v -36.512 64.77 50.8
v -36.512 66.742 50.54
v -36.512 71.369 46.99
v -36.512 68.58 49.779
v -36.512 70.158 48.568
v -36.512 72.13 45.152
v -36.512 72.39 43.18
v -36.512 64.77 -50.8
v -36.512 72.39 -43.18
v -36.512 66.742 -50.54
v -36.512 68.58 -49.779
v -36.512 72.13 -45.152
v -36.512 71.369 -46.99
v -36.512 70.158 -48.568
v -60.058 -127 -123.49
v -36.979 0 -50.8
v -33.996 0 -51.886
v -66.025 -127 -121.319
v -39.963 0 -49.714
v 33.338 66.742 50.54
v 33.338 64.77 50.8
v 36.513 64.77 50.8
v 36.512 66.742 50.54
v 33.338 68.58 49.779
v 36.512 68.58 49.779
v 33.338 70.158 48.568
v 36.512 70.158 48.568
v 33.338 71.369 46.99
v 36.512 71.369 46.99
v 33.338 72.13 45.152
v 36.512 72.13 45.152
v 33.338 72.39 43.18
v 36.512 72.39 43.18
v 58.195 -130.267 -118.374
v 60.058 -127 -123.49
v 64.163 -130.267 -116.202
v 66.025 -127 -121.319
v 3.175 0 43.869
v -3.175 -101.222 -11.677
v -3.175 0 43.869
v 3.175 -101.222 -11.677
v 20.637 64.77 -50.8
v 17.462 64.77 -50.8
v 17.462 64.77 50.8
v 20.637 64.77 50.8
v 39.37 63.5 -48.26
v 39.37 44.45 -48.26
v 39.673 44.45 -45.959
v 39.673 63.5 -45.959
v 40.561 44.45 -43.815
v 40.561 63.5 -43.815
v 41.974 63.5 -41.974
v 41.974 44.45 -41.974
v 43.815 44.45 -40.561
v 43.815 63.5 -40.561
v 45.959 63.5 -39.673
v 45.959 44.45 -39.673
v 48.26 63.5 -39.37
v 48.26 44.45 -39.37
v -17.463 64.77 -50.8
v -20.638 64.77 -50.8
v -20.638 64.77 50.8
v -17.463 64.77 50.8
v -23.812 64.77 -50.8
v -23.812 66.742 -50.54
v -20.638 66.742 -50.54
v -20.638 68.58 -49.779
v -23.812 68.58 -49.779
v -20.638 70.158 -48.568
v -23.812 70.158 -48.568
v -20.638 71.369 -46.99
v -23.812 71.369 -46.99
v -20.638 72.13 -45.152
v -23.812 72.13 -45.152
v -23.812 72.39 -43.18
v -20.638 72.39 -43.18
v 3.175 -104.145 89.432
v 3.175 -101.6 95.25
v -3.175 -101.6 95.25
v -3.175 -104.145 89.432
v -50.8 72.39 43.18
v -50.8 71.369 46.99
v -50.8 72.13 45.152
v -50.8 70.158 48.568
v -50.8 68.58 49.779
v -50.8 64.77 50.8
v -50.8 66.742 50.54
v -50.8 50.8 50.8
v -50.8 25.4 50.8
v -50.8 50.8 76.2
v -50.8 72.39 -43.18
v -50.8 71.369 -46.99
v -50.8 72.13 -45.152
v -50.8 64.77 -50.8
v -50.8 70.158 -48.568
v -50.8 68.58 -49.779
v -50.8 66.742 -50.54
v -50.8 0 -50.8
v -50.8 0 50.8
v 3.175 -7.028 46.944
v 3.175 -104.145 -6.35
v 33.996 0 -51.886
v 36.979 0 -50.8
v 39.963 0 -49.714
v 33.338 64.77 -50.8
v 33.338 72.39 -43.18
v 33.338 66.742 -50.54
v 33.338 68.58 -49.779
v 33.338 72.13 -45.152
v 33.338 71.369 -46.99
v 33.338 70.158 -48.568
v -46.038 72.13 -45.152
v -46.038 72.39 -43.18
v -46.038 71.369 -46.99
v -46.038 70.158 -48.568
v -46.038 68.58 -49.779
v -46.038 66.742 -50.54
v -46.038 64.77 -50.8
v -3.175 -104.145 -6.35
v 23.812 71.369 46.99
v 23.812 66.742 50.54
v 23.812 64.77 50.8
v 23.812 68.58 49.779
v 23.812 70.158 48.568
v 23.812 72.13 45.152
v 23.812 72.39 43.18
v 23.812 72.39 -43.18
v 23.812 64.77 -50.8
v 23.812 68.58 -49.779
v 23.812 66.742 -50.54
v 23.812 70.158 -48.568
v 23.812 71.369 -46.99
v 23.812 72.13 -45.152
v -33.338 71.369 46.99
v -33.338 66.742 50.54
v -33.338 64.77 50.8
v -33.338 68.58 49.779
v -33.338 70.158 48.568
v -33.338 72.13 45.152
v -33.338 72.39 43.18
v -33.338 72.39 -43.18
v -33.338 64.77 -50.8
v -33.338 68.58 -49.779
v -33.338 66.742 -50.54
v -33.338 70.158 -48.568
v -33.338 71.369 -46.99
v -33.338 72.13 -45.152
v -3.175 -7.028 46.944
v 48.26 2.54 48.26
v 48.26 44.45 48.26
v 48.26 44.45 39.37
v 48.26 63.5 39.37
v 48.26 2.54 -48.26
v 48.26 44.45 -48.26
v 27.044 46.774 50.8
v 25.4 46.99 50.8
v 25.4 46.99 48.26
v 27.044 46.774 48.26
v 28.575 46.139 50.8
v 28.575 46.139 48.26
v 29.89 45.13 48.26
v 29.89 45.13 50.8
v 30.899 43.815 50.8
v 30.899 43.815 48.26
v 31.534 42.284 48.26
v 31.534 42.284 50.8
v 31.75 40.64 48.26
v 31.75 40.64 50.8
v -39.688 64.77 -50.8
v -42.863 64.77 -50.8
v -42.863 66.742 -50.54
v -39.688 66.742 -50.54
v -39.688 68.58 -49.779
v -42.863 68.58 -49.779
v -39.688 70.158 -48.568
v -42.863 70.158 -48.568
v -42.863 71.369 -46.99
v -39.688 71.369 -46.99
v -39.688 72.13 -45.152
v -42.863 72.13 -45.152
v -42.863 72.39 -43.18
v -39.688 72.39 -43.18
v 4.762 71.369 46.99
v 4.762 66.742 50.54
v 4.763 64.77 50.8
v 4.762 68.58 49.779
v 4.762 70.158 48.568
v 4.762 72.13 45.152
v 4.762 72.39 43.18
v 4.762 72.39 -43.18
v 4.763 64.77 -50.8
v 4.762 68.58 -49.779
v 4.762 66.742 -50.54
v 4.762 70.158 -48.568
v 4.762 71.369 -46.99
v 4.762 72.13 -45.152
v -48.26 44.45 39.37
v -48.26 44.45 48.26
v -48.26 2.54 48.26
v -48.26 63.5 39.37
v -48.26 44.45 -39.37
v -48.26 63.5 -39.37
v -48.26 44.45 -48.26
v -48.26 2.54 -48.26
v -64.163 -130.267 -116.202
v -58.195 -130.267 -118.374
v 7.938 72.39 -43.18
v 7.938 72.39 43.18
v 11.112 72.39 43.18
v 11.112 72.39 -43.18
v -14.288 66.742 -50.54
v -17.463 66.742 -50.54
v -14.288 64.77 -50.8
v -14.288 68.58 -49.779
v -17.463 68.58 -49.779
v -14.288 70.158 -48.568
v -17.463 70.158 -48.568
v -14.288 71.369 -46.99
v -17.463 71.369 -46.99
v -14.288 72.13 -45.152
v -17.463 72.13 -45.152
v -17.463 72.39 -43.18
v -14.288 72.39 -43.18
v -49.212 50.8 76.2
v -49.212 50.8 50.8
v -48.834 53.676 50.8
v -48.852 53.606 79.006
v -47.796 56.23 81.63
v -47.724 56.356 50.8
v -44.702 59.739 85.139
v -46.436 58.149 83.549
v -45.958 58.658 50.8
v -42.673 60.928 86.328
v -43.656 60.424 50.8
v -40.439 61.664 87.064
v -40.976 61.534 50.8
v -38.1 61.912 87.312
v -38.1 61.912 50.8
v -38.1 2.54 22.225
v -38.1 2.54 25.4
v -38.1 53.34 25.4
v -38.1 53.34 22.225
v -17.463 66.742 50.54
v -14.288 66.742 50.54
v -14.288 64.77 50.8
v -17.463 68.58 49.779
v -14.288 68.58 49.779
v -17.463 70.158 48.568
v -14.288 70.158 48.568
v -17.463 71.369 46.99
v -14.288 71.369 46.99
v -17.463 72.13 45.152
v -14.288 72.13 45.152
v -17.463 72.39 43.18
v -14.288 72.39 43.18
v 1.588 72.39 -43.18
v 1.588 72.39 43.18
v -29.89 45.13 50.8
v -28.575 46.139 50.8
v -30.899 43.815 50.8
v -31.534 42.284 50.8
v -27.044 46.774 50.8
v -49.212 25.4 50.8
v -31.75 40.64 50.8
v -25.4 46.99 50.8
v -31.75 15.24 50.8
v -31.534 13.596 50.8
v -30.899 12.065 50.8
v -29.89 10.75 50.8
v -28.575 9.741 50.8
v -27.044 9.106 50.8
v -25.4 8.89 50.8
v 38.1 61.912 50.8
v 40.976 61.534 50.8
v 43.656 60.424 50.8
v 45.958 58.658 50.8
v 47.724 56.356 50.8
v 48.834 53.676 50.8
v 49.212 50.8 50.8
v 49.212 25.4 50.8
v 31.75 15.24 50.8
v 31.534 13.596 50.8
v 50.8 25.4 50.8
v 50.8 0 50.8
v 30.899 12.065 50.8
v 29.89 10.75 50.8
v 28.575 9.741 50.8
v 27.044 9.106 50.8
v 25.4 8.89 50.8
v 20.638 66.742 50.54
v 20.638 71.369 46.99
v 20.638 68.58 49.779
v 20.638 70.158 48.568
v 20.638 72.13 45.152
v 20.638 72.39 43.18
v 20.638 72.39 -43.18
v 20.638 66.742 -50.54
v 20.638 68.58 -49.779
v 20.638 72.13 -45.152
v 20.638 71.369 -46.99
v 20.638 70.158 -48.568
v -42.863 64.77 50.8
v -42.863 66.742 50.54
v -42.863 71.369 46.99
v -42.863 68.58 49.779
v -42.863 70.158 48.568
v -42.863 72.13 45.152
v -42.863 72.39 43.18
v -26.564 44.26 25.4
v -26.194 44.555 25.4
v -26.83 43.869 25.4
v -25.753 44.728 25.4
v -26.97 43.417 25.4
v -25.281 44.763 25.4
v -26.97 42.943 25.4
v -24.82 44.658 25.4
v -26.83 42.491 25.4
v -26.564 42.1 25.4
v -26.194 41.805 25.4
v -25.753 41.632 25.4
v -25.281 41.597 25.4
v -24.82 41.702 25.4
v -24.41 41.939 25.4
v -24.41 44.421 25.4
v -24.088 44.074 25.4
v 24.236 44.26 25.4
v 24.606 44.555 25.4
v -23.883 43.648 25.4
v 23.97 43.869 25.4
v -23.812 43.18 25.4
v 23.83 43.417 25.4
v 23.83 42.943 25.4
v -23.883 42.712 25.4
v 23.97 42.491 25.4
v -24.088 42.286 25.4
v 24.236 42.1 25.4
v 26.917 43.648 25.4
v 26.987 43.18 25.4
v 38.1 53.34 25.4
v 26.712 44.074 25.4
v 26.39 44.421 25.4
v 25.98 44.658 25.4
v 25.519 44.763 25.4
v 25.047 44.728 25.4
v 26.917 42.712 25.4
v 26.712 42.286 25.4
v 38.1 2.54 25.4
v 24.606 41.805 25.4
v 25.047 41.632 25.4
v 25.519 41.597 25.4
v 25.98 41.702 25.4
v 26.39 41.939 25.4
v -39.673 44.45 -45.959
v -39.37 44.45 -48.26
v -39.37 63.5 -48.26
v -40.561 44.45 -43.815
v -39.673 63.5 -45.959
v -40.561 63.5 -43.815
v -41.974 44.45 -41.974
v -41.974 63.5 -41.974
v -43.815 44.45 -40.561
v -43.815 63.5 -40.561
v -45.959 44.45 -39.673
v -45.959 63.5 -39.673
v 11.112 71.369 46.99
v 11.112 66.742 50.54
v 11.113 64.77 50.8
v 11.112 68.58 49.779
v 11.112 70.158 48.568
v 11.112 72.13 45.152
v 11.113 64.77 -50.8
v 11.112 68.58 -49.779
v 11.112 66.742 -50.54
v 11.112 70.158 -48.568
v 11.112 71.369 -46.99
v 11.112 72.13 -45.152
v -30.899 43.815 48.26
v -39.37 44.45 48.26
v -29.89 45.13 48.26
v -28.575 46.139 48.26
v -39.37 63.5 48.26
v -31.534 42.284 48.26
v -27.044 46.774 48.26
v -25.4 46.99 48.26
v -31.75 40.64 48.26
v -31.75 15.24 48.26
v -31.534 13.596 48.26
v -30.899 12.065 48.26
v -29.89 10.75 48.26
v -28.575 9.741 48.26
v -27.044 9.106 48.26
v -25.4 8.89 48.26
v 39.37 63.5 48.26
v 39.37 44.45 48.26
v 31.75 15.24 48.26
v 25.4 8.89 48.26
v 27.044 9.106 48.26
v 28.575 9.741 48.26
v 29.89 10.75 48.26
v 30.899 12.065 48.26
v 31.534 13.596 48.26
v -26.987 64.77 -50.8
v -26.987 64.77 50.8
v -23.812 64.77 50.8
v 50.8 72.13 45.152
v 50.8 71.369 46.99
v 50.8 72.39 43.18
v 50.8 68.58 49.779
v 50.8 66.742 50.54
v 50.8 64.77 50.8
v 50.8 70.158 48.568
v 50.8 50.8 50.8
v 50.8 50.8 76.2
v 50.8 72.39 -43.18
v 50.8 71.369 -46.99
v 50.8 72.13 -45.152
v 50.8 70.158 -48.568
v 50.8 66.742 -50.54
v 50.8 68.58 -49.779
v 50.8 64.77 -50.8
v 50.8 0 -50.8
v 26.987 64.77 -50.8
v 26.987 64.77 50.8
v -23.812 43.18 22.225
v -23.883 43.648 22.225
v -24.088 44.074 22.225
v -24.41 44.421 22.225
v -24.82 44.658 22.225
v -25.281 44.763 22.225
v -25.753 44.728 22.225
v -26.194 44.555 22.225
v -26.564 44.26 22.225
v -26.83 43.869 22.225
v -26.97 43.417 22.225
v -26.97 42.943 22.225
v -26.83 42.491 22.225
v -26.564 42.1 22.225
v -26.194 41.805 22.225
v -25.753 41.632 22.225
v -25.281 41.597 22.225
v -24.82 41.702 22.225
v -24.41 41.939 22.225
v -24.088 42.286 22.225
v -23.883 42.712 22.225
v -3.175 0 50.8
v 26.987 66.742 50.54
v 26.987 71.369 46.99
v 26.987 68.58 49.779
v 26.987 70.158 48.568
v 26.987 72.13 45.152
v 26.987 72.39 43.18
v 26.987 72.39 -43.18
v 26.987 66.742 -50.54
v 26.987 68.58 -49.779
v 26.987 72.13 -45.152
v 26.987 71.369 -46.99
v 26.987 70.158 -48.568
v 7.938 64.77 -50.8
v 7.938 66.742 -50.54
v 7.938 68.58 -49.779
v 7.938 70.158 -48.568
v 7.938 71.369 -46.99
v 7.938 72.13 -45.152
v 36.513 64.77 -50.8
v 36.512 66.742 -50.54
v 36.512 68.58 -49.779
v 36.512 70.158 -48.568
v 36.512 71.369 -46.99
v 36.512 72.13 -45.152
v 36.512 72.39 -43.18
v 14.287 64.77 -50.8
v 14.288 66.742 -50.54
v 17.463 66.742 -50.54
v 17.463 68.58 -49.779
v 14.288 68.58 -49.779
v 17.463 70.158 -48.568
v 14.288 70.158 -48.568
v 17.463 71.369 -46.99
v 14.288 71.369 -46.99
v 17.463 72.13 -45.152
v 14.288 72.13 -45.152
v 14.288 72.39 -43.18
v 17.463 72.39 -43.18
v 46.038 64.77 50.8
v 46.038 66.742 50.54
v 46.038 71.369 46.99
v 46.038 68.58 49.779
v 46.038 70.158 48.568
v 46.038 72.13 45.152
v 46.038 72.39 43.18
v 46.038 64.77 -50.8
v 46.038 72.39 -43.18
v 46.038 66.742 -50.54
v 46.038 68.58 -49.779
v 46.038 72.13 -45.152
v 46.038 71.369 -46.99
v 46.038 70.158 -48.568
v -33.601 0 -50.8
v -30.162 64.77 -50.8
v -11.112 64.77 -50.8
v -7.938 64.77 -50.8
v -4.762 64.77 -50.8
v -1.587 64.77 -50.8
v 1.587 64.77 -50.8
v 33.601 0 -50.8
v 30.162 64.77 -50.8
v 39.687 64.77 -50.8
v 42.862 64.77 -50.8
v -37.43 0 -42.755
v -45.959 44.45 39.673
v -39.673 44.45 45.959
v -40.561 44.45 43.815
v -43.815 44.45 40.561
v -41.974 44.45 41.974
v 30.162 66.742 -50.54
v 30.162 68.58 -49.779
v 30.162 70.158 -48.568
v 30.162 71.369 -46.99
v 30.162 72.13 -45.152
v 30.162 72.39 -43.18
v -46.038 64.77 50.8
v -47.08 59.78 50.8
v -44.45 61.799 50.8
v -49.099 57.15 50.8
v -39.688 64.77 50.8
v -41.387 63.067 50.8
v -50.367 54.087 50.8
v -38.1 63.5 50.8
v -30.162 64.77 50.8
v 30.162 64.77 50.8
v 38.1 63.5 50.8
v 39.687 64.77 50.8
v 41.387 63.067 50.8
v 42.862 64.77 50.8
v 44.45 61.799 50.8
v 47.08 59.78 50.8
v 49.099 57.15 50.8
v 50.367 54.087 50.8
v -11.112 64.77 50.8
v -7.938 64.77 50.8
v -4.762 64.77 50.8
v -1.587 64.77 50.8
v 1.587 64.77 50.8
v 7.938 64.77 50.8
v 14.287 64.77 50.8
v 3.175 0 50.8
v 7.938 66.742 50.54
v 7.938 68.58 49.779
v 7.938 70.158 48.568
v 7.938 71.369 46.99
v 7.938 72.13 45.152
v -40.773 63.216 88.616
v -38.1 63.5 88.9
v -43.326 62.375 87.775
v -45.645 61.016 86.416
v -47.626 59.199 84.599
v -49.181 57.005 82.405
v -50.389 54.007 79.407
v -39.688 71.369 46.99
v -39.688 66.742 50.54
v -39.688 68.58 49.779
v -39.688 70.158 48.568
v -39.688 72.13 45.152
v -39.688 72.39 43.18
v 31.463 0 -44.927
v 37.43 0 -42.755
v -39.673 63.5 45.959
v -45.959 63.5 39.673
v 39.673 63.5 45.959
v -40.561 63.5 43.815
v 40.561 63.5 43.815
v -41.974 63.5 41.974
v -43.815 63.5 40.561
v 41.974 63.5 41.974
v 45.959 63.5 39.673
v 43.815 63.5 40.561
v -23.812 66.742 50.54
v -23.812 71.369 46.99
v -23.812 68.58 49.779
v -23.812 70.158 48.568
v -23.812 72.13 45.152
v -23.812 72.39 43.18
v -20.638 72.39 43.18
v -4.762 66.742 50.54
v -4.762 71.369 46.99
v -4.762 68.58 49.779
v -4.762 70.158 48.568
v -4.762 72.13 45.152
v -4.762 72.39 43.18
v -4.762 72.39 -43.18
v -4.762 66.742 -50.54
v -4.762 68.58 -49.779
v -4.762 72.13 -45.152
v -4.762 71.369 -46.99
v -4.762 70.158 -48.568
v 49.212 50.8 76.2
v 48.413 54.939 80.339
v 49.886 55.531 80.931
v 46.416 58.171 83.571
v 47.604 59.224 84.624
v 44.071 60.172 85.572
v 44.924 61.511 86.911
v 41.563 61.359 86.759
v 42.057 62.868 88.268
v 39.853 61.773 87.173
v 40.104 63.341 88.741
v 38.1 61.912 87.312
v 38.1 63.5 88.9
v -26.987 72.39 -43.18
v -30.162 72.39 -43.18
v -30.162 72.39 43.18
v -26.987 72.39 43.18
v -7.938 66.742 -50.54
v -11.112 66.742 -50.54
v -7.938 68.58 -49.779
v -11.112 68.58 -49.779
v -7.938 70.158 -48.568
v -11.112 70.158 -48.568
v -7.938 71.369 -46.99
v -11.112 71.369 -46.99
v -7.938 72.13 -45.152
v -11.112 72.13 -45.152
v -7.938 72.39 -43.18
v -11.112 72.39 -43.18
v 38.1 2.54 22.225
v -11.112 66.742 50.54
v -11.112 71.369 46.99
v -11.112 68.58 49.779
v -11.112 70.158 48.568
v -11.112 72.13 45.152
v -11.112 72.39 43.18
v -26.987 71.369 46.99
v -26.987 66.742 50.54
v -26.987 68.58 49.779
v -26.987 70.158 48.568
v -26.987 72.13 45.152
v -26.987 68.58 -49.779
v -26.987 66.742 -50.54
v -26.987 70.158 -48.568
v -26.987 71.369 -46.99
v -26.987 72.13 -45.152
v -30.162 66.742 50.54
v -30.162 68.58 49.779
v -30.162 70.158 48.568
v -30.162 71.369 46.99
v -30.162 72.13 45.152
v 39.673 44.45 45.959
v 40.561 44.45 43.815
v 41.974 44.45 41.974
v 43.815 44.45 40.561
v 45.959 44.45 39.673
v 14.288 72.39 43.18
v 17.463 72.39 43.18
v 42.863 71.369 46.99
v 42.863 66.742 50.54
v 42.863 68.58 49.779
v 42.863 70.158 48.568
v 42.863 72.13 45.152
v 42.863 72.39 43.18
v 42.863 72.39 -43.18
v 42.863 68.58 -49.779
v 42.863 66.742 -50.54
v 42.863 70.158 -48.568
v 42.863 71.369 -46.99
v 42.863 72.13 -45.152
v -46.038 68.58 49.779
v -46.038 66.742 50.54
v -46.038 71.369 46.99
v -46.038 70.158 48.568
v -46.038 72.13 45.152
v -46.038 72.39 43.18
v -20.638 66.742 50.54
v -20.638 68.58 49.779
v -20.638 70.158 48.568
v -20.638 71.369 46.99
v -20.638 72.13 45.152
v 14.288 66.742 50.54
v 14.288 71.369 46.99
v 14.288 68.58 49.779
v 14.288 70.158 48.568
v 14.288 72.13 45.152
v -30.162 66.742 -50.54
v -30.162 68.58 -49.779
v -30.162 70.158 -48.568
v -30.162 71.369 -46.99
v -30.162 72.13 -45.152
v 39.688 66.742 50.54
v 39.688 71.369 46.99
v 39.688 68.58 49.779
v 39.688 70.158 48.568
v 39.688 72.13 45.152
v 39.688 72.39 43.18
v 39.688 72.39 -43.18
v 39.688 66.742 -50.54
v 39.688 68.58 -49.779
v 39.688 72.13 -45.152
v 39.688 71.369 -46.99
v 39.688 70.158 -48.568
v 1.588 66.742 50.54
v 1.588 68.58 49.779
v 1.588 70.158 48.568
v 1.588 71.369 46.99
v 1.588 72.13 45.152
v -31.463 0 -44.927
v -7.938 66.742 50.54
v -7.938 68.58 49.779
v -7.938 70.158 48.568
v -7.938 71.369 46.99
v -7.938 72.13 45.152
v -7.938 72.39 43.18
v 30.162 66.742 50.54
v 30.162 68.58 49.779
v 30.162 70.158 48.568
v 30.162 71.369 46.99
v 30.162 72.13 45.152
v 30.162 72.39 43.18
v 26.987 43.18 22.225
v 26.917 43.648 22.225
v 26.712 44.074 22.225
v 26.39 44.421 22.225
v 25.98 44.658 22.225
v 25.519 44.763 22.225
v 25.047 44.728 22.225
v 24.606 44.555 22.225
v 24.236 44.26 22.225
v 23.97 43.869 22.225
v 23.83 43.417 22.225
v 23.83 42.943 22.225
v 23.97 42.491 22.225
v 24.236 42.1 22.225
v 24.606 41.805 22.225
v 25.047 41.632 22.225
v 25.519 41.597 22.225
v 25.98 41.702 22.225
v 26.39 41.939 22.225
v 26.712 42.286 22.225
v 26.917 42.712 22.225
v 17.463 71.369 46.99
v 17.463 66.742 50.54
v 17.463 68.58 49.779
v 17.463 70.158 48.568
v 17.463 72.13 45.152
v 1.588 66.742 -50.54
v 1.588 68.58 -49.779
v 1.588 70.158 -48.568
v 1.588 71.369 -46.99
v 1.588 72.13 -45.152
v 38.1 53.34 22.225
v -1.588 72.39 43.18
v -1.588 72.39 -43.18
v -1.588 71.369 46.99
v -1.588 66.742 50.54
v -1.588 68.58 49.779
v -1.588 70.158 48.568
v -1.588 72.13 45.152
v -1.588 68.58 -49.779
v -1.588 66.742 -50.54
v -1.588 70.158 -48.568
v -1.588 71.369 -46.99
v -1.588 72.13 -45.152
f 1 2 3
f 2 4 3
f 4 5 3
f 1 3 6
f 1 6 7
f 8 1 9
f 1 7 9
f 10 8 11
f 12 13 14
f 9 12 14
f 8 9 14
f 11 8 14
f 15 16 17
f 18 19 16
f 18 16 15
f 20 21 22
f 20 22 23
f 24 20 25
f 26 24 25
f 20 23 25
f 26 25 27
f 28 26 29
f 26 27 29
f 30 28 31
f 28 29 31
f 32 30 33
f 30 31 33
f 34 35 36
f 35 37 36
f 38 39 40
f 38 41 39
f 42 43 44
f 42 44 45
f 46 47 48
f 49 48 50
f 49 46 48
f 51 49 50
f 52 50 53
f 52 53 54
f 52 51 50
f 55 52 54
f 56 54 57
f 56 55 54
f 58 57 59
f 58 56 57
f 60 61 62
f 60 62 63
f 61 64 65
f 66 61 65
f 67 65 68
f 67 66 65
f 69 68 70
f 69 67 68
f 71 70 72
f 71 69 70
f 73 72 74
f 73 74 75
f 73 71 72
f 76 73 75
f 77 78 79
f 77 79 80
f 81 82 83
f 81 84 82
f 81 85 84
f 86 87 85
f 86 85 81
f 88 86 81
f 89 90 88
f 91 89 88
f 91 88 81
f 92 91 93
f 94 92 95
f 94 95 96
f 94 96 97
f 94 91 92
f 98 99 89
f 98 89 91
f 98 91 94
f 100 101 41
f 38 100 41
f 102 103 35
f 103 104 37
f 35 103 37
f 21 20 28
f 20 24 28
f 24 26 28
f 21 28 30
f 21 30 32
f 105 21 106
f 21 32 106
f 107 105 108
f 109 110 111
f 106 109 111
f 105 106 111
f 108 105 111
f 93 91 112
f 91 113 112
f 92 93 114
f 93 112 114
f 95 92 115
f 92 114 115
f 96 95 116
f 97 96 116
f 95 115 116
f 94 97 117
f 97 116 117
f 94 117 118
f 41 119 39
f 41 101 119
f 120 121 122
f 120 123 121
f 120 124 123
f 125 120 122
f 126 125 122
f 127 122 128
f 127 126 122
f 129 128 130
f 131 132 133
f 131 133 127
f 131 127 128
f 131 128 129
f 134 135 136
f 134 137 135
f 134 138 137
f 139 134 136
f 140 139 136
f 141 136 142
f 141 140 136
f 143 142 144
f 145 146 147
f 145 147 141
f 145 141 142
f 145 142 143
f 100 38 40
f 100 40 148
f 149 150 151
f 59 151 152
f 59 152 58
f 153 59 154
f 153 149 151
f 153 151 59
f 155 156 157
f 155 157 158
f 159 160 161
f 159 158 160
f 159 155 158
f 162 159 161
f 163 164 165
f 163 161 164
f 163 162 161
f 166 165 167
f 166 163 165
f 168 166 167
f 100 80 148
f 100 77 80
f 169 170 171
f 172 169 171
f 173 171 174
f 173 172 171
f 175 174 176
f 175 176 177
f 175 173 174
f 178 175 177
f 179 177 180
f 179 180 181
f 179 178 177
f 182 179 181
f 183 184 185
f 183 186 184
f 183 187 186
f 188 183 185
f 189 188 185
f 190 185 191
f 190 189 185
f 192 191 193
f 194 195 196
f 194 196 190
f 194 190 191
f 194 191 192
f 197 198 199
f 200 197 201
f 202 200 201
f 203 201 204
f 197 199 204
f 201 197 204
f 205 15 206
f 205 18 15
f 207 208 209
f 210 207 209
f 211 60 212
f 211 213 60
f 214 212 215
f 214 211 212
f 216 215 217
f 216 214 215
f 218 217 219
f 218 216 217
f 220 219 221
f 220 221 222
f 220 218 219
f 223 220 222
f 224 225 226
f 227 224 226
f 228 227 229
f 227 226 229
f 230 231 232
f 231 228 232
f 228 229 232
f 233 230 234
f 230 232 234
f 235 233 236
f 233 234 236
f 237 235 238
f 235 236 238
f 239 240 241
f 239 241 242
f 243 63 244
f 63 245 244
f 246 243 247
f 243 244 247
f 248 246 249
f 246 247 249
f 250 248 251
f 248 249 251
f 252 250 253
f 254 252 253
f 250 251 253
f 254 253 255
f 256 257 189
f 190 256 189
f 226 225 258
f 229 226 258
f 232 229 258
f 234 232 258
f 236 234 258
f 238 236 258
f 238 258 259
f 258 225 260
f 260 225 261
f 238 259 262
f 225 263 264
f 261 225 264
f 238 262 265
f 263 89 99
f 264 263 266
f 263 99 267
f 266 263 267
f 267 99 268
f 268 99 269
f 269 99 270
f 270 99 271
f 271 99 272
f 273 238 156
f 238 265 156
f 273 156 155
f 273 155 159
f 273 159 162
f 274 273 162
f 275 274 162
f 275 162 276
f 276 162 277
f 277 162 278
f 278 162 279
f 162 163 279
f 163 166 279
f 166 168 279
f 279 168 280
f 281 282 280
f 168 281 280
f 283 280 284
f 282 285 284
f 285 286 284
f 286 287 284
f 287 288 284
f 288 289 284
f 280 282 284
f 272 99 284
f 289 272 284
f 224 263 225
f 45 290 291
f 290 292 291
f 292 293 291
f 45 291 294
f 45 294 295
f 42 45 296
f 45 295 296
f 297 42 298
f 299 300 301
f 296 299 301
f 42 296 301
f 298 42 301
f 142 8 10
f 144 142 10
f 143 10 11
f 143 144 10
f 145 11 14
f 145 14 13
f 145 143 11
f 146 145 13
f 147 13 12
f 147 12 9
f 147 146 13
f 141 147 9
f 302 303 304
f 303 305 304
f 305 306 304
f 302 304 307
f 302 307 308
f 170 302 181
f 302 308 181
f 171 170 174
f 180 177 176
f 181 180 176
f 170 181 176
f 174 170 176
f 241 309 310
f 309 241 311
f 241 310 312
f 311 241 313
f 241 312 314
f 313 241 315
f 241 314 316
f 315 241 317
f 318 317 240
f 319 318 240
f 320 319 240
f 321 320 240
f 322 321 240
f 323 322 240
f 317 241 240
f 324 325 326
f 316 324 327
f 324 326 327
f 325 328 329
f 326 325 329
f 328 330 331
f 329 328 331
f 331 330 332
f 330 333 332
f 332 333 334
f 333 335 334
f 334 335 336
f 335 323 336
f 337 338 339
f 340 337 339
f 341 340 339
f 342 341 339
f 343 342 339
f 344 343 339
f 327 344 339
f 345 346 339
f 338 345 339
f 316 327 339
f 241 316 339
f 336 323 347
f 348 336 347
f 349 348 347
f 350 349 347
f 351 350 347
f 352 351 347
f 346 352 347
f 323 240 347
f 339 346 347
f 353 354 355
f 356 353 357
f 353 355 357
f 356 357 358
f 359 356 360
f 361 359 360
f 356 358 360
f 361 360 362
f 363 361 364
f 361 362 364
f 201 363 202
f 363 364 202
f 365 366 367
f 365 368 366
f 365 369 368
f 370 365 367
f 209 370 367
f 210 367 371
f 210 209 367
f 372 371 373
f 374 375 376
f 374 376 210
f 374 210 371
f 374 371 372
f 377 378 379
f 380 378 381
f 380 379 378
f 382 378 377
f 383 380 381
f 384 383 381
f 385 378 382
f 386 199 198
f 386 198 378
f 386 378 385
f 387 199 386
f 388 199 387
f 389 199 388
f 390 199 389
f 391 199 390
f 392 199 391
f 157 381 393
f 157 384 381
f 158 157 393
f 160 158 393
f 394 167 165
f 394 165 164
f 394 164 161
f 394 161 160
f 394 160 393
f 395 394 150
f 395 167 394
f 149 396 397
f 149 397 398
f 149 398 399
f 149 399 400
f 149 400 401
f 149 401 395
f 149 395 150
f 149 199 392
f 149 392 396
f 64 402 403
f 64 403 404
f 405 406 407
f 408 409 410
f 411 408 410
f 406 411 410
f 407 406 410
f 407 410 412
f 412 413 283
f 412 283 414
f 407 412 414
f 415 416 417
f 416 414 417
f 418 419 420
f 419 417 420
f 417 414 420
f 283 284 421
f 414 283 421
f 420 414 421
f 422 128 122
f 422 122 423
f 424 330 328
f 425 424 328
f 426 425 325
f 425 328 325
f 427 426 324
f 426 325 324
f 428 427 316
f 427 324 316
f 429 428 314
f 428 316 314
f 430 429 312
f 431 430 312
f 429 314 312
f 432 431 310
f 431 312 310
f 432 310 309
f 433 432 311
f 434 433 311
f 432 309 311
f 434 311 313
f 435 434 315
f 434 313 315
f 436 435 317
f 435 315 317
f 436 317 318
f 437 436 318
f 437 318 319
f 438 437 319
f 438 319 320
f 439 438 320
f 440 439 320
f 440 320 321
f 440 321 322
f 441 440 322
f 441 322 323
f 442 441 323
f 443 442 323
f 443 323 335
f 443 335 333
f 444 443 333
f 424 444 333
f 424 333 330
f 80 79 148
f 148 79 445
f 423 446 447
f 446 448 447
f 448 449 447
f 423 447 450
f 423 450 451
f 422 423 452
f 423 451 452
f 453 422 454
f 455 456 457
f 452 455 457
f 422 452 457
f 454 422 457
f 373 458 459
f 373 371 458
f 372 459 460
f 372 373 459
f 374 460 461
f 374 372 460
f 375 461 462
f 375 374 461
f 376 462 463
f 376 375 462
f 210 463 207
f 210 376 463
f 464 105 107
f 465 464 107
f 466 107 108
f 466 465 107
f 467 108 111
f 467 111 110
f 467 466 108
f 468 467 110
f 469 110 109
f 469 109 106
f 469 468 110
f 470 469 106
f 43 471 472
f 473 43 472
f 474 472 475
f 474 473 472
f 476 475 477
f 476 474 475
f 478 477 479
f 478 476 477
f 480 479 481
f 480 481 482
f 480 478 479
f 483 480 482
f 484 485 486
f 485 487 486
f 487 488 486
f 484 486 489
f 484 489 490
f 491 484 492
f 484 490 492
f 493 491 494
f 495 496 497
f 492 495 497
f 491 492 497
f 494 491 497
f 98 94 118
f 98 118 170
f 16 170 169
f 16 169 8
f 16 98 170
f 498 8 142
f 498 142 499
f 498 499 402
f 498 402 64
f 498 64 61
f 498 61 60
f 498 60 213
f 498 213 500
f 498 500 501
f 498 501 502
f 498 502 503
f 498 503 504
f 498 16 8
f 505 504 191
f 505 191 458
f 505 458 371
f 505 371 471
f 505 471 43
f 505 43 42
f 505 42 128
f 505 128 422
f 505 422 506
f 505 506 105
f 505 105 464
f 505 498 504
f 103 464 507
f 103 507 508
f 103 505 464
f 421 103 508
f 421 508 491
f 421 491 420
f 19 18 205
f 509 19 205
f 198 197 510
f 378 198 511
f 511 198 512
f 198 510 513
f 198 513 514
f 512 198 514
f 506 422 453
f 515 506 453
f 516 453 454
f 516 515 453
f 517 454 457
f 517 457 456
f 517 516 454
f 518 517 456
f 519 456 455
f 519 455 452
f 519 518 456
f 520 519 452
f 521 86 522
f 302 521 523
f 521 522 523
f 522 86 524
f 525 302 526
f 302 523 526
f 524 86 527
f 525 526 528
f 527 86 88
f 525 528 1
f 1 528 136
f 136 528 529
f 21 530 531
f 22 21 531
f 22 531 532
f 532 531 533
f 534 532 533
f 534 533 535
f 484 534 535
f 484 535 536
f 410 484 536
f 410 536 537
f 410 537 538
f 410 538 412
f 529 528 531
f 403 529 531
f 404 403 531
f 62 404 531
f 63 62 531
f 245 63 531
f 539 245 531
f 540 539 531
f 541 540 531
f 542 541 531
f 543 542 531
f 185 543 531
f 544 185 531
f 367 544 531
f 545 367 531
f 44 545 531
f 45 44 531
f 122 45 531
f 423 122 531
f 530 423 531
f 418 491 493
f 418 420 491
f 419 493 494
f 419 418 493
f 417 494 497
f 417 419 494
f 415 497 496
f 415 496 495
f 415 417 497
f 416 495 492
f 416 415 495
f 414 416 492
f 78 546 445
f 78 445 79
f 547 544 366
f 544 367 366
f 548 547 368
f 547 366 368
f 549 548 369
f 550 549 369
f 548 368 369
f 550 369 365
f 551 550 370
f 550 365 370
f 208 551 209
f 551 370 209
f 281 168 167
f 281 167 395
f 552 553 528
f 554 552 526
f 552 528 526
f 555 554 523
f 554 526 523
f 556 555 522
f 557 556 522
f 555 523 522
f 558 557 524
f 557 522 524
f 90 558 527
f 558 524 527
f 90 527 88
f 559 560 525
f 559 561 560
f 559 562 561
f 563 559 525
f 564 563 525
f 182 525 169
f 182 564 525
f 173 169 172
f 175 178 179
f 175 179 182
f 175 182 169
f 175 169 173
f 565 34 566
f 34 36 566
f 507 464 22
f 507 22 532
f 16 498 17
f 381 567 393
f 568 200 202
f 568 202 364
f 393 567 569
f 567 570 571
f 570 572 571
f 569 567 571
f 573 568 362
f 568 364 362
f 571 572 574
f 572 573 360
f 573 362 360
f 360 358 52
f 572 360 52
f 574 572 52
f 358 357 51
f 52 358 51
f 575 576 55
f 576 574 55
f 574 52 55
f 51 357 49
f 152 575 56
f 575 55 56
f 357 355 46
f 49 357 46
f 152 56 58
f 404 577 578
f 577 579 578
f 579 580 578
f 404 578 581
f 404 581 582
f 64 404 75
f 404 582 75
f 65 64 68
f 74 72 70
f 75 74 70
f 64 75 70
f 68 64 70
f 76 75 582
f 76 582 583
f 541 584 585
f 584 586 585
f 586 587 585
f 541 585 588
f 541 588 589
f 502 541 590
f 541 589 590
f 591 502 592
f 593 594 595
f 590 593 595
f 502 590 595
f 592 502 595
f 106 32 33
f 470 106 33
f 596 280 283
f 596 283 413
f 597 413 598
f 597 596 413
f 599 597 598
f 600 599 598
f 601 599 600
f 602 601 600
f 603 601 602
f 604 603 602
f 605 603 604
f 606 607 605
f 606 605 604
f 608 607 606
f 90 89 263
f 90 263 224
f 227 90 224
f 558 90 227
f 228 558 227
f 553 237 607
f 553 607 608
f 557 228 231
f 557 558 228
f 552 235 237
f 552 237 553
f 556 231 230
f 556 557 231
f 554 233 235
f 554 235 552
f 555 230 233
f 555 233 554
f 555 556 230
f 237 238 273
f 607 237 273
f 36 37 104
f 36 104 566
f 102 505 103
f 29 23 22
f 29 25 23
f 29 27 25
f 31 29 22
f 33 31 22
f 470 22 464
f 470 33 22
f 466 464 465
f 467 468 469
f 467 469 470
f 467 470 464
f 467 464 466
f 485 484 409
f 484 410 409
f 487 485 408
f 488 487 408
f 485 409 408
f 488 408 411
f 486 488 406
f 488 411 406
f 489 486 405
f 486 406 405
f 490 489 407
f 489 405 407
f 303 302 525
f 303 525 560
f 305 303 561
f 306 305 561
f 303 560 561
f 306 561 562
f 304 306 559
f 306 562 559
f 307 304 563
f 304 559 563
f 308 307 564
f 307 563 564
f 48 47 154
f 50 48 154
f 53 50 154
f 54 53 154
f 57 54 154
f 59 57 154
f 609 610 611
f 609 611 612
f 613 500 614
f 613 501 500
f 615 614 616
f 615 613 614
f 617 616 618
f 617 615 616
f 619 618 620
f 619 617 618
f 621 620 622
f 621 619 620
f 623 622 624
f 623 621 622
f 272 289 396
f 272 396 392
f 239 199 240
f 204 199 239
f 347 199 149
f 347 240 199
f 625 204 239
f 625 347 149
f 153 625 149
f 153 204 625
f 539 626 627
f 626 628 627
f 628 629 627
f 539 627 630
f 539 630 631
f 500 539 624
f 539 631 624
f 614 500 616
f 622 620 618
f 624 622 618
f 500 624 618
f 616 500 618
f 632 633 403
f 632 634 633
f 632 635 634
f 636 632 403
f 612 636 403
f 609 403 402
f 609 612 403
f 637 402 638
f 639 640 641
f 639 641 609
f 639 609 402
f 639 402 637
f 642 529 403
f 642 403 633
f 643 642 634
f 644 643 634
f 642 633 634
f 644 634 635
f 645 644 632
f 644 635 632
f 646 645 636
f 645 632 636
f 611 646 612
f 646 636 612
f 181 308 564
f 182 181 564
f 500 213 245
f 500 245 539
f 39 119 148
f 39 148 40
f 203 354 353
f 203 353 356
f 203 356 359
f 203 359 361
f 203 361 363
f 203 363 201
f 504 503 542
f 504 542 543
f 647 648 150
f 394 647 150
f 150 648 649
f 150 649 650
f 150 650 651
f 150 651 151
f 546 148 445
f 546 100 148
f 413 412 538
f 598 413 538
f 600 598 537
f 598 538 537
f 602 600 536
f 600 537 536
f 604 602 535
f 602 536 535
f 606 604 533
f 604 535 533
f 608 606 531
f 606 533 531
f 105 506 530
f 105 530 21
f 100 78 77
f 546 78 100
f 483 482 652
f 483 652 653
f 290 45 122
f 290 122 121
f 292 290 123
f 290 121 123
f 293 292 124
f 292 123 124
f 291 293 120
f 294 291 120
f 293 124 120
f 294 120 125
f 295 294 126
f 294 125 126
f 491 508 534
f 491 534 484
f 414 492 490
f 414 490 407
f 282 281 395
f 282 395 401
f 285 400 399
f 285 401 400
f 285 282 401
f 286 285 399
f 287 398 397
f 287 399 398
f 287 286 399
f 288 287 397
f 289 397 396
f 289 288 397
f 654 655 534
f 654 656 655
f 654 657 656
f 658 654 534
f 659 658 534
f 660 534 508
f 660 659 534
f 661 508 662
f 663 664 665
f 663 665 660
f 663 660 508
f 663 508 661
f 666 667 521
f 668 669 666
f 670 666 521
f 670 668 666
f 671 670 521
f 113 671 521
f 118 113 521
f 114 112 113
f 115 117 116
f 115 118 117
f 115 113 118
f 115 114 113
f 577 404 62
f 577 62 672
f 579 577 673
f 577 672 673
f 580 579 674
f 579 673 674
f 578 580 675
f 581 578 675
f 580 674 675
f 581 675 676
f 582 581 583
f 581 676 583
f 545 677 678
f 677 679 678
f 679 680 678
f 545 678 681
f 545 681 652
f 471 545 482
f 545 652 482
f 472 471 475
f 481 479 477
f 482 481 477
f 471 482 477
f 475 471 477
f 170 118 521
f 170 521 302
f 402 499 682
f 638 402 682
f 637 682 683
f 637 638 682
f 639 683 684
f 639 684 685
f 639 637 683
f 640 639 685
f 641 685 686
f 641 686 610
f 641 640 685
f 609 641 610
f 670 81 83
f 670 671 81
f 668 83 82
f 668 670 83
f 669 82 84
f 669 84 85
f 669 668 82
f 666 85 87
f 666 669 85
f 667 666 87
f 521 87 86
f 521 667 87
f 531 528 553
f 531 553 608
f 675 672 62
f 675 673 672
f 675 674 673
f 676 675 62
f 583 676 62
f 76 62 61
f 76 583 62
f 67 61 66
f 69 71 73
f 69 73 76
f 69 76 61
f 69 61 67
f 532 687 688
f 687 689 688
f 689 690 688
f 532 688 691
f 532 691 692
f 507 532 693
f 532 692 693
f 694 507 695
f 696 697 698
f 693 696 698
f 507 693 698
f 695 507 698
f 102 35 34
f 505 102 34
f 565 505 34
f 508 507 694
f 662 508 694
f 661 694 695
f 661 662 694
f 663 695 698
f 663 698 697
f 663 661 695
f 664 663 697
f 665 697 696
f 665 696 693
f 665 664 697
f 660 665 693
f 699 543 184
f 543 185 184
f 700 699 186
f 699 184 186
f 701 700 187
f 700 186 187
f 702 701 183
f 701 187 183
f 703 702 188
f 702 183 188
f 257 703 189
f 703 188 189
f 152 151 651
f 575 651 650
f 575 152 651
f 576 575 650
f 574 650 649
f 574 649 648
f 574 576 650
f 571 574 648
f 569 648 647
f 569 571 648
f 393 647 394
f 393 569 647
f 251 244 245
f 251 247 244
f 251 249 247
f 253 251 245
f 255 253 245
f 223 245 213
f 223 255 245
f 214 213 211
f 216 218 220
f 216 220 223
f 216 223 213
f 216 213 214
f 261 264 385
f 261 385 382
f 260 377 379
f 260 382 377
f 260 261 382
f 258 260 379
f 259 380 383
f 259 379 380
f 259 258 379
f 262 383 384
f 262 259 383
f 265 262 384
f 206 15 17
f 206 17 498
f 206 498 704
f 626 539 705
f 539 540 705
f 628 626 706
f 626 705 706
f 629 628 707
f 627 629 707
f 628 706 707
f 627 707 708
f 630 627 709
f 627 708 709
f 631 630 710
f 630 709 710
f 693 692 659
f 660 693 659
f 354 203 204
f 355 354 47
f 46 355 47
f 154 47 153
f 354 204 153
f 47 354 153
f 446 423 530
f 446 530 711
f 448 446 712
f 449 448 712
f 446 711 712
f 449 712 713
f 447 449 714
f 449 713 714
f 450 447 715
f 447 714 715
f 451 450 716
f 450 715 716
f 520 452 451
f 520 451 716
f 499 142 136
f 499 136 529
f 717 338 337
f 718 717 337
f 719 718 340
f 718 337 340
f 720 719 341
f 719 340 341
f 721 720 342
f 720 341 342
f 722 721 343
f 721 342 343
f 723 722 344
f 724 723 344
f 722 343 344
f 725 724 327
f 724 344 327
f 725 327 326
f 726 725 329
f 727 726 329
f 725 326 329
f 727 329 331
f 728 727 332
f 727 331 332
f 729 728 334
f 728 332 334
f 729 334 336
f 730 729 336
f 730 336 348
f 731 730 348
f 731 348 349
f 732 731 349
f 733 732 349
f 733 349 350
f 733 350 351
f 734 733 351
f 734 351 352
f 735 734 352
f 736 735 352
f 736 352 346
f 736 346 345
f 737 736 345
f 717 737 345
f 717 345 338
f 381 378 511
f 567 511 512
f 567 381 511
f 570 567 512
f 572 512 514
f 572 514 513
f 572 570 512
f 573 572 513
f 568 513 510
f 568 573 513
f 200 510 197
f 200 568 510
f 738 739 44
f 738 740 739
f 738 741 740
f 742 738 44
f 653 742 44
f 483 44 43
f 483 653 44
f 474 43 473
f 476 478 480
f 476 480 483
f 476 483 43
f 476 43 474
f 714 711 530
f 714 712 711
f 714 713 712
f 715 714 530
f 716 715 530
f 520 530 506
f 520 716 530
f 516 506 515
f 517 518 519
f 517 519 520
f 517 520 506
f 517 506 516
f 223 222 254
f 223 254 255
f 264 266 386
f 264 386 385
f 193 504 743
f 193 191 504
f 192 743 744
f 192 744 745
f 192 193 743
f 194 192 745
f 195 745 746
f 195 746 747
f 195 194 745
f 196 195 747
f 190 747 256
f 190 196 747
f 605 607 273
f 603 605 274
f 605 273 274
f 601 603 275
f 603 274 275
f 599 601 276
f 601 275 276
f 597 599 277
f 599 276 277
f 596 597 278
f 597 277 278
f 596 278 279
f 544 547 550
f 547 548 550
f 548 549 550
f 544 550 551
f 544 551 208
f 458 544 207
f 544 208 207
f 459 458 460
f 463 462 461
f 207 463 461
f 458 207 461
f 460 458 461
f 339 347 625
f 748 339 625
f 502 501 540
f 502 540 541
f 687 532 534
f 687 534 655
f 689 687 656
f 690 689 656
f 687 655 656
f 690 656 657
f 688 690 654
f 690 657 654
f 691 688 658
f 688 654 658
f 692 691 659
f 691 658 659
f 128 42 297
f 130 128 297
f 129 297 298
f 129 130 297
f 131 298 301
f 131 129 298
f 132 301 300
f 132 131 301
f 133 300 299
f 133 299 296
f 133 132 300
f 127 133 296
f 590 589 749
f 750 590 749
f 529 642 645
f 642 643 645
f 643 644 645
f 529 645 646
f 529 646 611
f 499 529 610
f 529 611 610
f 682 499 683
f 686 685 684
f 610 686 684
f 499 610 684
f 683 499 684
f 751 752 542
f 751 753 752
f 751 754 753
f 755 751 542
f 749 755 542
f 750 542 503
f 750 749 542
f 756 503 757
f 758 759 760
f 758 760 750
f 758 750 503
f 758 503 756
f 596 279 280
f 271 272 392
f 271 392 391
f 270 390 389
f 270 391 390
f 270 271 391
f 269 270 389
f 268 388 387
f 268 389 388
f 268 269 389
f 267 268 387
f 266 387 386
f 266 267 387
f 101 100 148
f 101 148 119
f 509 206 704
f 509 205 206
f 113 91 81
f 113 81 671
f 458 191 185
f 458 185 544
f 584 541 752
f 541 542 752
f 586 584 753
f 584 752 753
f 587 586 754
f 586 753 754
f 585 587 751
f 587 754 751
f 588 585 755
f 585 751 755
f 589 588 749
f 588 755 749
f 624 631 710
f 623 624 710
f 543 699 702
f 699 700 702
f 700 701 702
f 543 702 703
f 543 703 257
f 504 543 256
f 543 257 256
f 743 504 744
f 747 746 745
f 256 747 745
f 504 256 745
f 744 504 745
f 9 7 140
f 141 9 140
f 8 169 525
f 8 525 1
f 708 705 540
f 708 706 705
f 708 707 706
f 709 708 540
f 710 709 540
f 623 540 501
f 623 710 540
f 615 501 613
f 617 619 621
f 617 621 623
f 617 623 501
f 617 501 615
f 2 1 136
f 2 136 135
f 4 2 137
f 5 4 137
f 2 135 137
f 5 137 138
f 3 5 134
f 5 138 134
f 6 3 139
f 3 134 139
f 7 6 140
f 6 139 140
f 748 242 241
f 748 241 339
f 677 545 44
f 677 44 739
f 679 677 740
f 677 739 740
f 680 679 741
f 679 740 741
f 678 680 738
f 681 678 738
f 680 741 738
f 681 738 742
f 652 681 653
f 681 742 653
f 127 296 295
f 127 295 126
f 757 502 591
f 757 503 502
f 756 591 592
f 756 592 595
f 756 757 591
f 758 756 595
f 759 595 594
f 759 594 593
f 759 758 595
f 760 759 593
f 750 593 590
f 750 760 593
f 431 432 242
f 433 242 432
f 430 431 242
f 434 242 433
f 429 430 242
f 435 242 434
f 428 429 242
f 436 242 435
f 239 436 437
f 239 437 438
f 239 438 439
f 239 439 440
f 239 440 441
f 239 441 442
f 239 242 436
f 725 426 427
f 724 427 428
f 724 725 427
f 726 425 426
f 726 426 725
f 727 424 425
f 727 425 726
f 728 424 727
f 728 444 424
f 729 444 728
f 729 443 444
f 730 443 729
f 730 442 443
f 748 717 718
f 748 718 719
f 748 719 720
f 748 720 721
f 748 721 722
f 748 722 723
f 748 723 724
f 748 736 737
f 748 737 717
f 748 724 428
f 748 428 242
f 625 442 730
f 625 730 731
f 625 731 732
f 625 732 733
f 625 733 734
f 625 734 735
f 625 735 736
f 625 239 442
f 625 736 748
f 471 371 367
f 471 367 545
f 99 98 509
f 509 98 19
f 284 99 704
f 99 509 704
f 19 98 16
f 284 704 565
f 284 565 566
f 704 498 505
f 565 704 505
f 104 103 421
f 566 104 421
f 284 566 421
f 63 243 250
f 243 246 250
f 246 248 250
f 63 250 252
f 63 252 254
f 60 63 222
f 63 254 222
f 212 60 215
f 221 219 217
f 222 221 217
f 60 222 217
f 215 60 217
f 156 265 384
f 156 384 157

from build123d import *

# Parameters (mm, degrees)
SKETCH1_W             = 101.6
SKETCH1_H             = 101.6
BOSS_EXTRUDE1_DEPTH   = 63.5
SHELL1_T              = -2.54
CUT_EXTRUDE2_REACH    = 103.6
SKETCH4_W             = 76.2
SKETCH4_H             = 3.175
BOSS_EXTRUDE2_DEPTH   = 50.8
CUT_EXTRUDE3_REACH    = 78.2
SKETCH5_R             = 1.5875
BOSS_EXTRUDE3_DEPTH   = 19.05
BOSS_EXTRUDE4_DEPTH   = 38.1
CUT_EXTRUDE4_DEPTH    = 102.6
BOSS_EXTRUDE5_DEPTH   = 3.175
BOSS_EXTRUDE5_2_DEPTH = 3.175
BOSS_EXTRUDE6_DEPTH   = 3.175
SKETCH12_W            = 101.6
SKETCH12_H            = 101.6
BOSS_EXTRUDE7_DEPTH   = 8.89
SKETCH13_W            = 3.175
SKETCH13_H            = 101.6
CUT_EXTRUDE5_DEPTH    = 7.62
FILLET1_R             = 7.62


with BuildPart() as part:
    # Sketch1 → Boss-Extrude1 (new body)
    with BuildSketch(Plane(origin=(0, 0, 0), x_dir=(1, 0, 0), z_dir=(0, 1, 0))):
        Rectangle(SKETCH1_W, SKETCH1_H)
    extrude(amount=BOSS_EXTRUDE1_DEPTH)

    # Shell1
    shell1_openings = [part.faces().sort_by_distance(p)[0] for p in [
        (0, 63.5, 0),
    ]]
    offset(amount=SHELL1_T, openings=shell1_openings, kind=Kind.INTERSECTION)

    # Sketch3 → Cut-Extrude2 (cut, up to next)
    with BuildSketch(Plane.XY.offset(50.8), mode=Mode.PRIVATE) as cut_extrude2_sk1:
        with BuildLine():
            Line((-25.4, 46.99), (25.4, 46.99))
            ThreePointArc((25.4, 46.99), (29.890128061, 45.130128061), (31.75, 40.64))
            Line((31.75, 40.64), (31.75, 15.24))
            ThreePointArc((31.75, 15.24), (29.890128061, 10.749871939), (25.4, 8.89))
            Line((25.4, 8.89), (-25.4, 8.89))
            ThreePointArc((-25.4, 8.89), (-29.890128061, 10.749871939), (-31.75, 15.24))
            Line((-31.75, 15.24), (-31.75, 40.64))
            ThreePointArc((-31.75, 40.64), (-29.890128061, 45.130128061), (-25.4, 46.99))
        make_face()
    cut_extrude2_tool1 = extrude(cut_extrude2_sk1.sketch, amount=-CUT_EXTRUDE2_REACH, mode=Mode.PRIVATE) & part.part
    add(cut_extrude2_tool1.solids().sort_by_distance((0, 27.94, 50.8))[0], mode=Mode.SUBTRACT)

    # Sketch4 → Boss-Extrude2 (add)
    with BuildSketch(Plane(origin=(0, 2.54, 0), x_dir=(1, 0, 0), z_dir=(0, 1, 0))):
        with Locations((0, -23.8125)):
            Rectangle(SKETCH4_W, SKETCH4_H)
    extrude(amount=BOSS_EXTRUDE2_DEPTH)

    # Sketch5 → Cut-Extrude3 (cut, up to next)
    with BuildSketch(Plane.XY.offset(25.4), mode=Mode.PRIVATE) as cut_extrude3_sk1:
        with Locations((-25.4, 43.18)):
            Circle(SKETCH5_R)
    cut_extrude3_tool1 = extrude(cut_extrude3_sk1.sketch, amount=-CUT_EXTRUDE3_REACH, mode=Mode.PRIVATE) & part.part
    add(cut_extrude3_tool1.solids().sort_by_distance((-25.4, 43.18, 25.4))[0], mode=Mode.SUBTRACT)
    # Sketch5 → Cut-Extrude3 (cut, up to next)
    with BuildSketch(Plane.XY.offset(25.4), mode=Mode.PRIVATE) as cut_extrude3_sk2:
        with Locations((25.4, 43.18)):
            Circle(SKETCH5_R)
    cut_extrude3_tool2 = extrude(cut_extrude3_sk2.sketch, amount=-CUT_EXTRUDE3_REACH, mode=Mode.PRIVATE) & part.part
    add(cut_extrude3_tool2.solids().sort_by_distance((25.4, 43.18, 25.4))[0], mode=Mode.SUBTRACT)

    # Sketch6 → Boss-Extrude3 (add)
    with BuildSketch(Plane(origin=(0, 63.5, 0), x_dir=(1, 0, 0), z_dir=(0, 1, 0))):
        with BuildLine():
            Line((-48.26, -39.37), (-48.26, -48.26))
            Line((-48.26, -48.26), (-39.37, -48.26))
            ThreePointArc((-39.37, -48.26), (-41.973820715, -41.973820715), (-48.26, -39.37))
        make_face()
        with BuildLine():
            Line((39.37, -48.26), (48.26, -48.26))
            Line((48.26, -48.26), (48.26, -39.37))
            ThreePointArc((48.26, -39.37), (41.973820715, -41.973820715), (39.37, -48.26))
        make_face()
        with BuildLine():
            Line((48.26, 39.37), (48.26, 48.26))
            Line((48.26, 48.26), (39.37, 48.26))
            ThreePointArc((39.37, 48.26), (41.973820715, 41.973820715), (48.26, 39.37))
        make_face()
        with BuildLine():
            Line((-48.26, 39.37), (-48.26, 48.26))
            Line((-48.26, 48.26), (-39.37, 48.26))
            ThreePointArc((-39.37, 48.26), (-41.973820715, 41.973820715), (-48.26, 39.37))
        make_face()
    extrude(amount=-BOSS_EXTRUDE3_DEPTH)

    # Sketch7 → Boss-Extrude4 (add)
    with BuildSketch(Plane.XY.offset(50.8)):
        with BuildLine():
            Line((38.1, 63.5), (-38.1, 63.5))
            ThreePointArc((-38.1, 63.5), (-47.080256121, 59.780256121), (-50.8, 50.8))
            Line((-50.8, 50.8), (-50.8, 25.4))
            Line((-50.8, 25.4), (-49.2125, 25.4))
            Line((-49.2125, 25.4), (-49.2125, 50.8))
            ThreePointArc((-49.2125, 50.8), (-45.957724106, 58.657724106), (-38.1, 61.9125))
            Line((-38.1, 61.9125), (38.1, 61.9125))
            ThreePointArc((38.1, 61.9125), (45.957724106, 58.657724106), (49.2125, 50.8))
            Line((49.2125, 50.8), (49.2125, 25.4))
            Line((49.2125, 25.4), (50.8, 25.4))
            Line((50.8, 25.4), (50.8, 50.8))
            ThreePointArc((50.8, 50.8), (47.080256121, 59.780256121), (38.1, 63.5))
        make_face()
    extrude(amount=BOSS_EXTRUDE4_DEPTH)

    # Sketch8 → Cut-Extrude4 (cut, through all)
    with BuildSketch(Plane.ZY.offset(50.8)):
        Polygon((50.8, 25.4), (88.9, 63.5), (88.9, 25.4), align=None)
    extrude(amount=-CUT_EXTRUDE4_DEPTH, mode=Mode.SUBTRACT)

    # Sketch11 → Boss-Extrude6 (add, symmetric)
    with BuildSketch(Plane(origin=(16.326805286, 0, 5.942471145), x_dir=(0.342020143, 0, -0.939692621), z_dir=(0.939692621, 0, 0.342020143))):
        Polygon((60.384076548, 0), (136.584076548, -127), (131.138996469, -130.267048047), (52.978767641, 0), align=None)
    boss_extrude6 = extrude(amount=BOSS_EXTRUDE6_DEPTH, both=True)

    # Mirror1: Boss-Extrude6 across plane
    add(boss_extrude6.mirror(Plane(origin=(0, 0, 0), x_dir=(0, 0, 1), z_dir=(1, 0, 0))))

    # Sketch12 → Boss-Extrude7 (add)
    with BuildSketch(Plane(origin=(0, 63.5, 0), x_dir=(1, 0, 0), z_dir=(0, 1, 0))):
        Rectangle(SKETCH12_W, SKETCH12_H)
    extrude(amount=BOSS_EXTRUDE7_DEPTH)

    # Sketch13 → Cut-Extrude5 (cut)
    with BuildSketch(Plane(origin=(0, 72.39, 0), x_dir=(1, 0, 0), z_dir=(0, 1, 0))):
        Rectangle(SKETCH13_W, SKETCH13_H)
        with Locations((-6.35, 0)):
            Rectangle(SKETCH13_W, SKETCH13_H)
        with Locations((-12.7, 0)):
            Rectangle(SKETCH13_W, SKETCH13_H)
        with Locations((-19.05, 0)):
            Rectangle(SKETCH13_W, SKETCH13_H)
        with Locations((-25.4, 0)):
            Rectangle(SKETCH13_W, SKETCH13_H)
        with Locations((-31.75, 0)):
            Rectangle(SKETCH13_W, SKETCH13_H)
        with Locations((-38.1, 0)):
            Rectangle(SKETCH13_W, SKETCH13_H)
        with Locations((-44.45, 0)):
            Rectangle(SKETCH13_W, SKETCH13_H)
        with Locations((6.35, 0)):
            Rectangle(SKETCH13_W, SKETCH13_H)
        with Locations((12.7, 0)):
            Rectangle(SKETCH13_W, SKETCH13_H)
        with Locations((19.05, 0)):
            Rectangle(SKETCH13_W, SKETCH13_H)
        with Locations((25.4, 0)):
            Rectangle(SKETCH13_W, SKETCH13_H)
        with Locations((31.75, 0)):
            Rectangle(SKETCH13_W, SKETCH13_H)
        with Locations((38.1, 0)):
            Rectangle(SKETCH13_W, SKETCH13_H)
        with Locations((44.45, 0)):
            Rectangle(SKETCH13_W, SKETCH13_H)
    extrude(amount=-CUT_EXTRUDE5_DEPTH, mode=Mode.SUBTRACT)

    # Fillet1
    fillet1_edges = [part.edges().sort_by_distance(p)[0] for p in [
        (48.41875, 72.39, -50.8),
        (41.275, 72.39, -50.8),
        (34.925, 72.39, -50.8),
        (28.575, 72.39, -50.8),
        (22.225, 72.39, -50.8),
        (15.875, 72.39, -50.8),
        (9.525, 72.39, -50.8),
        (3.175, 72.39, -50.8),
        (-3.175, 72.39, -50.8),
        (-9.525, 72.39, -50.8),
        (-15.875, 72.39, -50.8),
        (-22.225, 72.39, -50.8),
        (-28.575, 72.39, -50.8),
        (-34.925, 72.39, -50.8),
        (-41.275, 72.39, -50.8),
        (-48.41875, 72.39, -50.8),
        (48.41875, 72.39, 50.8),
        (41.275, 72.39, 50.8),
        (34.925, 72.39, 50.8),
        (28.575, 72.39, 50.8),
        (22.225, 72.39, 50.8),
        (15.875, 72.39, 50.8),
        (9.525, 72.39, 50.8),
        (3.175, 72.39, 50.8),
        (-3.175, 72.39, 50.8),
        (-9.525, 72.39, 50.8),
        (-15.875, 72.39, 50.8),
        (-22.225, 72.39, 50.8),
        (-28.575, 72.39, 50.8),
        (-34.925, 72.39, 50.8),
        (-41.275, 72.39, 50.8),
        (-48.41875, 72.39, 50.8),
    ]]
    fillet(fillet1_edges, radius=FILLET1_R)


with BuildPart() as body_2:
    # Sketch9 → Boss-Extrude5 (new body, symmetric)
    with BuildSketch(Plane(origin=(0, 0, 0), x_dir=(0, 0, -1), z_dir=(1, 0, 0))):
        Polygon((11.677003567, -101.221989933), (-43.8688761, 0), (-46.943509518, -7.027733526), (6.35, -104.145199596), align=None)
    extrude(amount=BOSS_EXTRUDE5_DEPTH, both=True)


with BuildPart() as body_3:
    # Sketch9 → Boss-Extrude5 2 (new body, symmetric)
    with BuildSketch(Plane(origin=(0, 0, 0), x_dir=(0, 0, -1), z_dir=(1, 0, 0))):
        Polygon((-46.943509518, -7.027733526), (-50.8, 0), (-95.25, -101.6), (-89.432400923, -104.145199596), align=None)
    extrude(amount=BOSS_EXTRUDE5_2_DEPTH, both=True)


solid = Compound([part.part, body_2.part, body_3.part])
